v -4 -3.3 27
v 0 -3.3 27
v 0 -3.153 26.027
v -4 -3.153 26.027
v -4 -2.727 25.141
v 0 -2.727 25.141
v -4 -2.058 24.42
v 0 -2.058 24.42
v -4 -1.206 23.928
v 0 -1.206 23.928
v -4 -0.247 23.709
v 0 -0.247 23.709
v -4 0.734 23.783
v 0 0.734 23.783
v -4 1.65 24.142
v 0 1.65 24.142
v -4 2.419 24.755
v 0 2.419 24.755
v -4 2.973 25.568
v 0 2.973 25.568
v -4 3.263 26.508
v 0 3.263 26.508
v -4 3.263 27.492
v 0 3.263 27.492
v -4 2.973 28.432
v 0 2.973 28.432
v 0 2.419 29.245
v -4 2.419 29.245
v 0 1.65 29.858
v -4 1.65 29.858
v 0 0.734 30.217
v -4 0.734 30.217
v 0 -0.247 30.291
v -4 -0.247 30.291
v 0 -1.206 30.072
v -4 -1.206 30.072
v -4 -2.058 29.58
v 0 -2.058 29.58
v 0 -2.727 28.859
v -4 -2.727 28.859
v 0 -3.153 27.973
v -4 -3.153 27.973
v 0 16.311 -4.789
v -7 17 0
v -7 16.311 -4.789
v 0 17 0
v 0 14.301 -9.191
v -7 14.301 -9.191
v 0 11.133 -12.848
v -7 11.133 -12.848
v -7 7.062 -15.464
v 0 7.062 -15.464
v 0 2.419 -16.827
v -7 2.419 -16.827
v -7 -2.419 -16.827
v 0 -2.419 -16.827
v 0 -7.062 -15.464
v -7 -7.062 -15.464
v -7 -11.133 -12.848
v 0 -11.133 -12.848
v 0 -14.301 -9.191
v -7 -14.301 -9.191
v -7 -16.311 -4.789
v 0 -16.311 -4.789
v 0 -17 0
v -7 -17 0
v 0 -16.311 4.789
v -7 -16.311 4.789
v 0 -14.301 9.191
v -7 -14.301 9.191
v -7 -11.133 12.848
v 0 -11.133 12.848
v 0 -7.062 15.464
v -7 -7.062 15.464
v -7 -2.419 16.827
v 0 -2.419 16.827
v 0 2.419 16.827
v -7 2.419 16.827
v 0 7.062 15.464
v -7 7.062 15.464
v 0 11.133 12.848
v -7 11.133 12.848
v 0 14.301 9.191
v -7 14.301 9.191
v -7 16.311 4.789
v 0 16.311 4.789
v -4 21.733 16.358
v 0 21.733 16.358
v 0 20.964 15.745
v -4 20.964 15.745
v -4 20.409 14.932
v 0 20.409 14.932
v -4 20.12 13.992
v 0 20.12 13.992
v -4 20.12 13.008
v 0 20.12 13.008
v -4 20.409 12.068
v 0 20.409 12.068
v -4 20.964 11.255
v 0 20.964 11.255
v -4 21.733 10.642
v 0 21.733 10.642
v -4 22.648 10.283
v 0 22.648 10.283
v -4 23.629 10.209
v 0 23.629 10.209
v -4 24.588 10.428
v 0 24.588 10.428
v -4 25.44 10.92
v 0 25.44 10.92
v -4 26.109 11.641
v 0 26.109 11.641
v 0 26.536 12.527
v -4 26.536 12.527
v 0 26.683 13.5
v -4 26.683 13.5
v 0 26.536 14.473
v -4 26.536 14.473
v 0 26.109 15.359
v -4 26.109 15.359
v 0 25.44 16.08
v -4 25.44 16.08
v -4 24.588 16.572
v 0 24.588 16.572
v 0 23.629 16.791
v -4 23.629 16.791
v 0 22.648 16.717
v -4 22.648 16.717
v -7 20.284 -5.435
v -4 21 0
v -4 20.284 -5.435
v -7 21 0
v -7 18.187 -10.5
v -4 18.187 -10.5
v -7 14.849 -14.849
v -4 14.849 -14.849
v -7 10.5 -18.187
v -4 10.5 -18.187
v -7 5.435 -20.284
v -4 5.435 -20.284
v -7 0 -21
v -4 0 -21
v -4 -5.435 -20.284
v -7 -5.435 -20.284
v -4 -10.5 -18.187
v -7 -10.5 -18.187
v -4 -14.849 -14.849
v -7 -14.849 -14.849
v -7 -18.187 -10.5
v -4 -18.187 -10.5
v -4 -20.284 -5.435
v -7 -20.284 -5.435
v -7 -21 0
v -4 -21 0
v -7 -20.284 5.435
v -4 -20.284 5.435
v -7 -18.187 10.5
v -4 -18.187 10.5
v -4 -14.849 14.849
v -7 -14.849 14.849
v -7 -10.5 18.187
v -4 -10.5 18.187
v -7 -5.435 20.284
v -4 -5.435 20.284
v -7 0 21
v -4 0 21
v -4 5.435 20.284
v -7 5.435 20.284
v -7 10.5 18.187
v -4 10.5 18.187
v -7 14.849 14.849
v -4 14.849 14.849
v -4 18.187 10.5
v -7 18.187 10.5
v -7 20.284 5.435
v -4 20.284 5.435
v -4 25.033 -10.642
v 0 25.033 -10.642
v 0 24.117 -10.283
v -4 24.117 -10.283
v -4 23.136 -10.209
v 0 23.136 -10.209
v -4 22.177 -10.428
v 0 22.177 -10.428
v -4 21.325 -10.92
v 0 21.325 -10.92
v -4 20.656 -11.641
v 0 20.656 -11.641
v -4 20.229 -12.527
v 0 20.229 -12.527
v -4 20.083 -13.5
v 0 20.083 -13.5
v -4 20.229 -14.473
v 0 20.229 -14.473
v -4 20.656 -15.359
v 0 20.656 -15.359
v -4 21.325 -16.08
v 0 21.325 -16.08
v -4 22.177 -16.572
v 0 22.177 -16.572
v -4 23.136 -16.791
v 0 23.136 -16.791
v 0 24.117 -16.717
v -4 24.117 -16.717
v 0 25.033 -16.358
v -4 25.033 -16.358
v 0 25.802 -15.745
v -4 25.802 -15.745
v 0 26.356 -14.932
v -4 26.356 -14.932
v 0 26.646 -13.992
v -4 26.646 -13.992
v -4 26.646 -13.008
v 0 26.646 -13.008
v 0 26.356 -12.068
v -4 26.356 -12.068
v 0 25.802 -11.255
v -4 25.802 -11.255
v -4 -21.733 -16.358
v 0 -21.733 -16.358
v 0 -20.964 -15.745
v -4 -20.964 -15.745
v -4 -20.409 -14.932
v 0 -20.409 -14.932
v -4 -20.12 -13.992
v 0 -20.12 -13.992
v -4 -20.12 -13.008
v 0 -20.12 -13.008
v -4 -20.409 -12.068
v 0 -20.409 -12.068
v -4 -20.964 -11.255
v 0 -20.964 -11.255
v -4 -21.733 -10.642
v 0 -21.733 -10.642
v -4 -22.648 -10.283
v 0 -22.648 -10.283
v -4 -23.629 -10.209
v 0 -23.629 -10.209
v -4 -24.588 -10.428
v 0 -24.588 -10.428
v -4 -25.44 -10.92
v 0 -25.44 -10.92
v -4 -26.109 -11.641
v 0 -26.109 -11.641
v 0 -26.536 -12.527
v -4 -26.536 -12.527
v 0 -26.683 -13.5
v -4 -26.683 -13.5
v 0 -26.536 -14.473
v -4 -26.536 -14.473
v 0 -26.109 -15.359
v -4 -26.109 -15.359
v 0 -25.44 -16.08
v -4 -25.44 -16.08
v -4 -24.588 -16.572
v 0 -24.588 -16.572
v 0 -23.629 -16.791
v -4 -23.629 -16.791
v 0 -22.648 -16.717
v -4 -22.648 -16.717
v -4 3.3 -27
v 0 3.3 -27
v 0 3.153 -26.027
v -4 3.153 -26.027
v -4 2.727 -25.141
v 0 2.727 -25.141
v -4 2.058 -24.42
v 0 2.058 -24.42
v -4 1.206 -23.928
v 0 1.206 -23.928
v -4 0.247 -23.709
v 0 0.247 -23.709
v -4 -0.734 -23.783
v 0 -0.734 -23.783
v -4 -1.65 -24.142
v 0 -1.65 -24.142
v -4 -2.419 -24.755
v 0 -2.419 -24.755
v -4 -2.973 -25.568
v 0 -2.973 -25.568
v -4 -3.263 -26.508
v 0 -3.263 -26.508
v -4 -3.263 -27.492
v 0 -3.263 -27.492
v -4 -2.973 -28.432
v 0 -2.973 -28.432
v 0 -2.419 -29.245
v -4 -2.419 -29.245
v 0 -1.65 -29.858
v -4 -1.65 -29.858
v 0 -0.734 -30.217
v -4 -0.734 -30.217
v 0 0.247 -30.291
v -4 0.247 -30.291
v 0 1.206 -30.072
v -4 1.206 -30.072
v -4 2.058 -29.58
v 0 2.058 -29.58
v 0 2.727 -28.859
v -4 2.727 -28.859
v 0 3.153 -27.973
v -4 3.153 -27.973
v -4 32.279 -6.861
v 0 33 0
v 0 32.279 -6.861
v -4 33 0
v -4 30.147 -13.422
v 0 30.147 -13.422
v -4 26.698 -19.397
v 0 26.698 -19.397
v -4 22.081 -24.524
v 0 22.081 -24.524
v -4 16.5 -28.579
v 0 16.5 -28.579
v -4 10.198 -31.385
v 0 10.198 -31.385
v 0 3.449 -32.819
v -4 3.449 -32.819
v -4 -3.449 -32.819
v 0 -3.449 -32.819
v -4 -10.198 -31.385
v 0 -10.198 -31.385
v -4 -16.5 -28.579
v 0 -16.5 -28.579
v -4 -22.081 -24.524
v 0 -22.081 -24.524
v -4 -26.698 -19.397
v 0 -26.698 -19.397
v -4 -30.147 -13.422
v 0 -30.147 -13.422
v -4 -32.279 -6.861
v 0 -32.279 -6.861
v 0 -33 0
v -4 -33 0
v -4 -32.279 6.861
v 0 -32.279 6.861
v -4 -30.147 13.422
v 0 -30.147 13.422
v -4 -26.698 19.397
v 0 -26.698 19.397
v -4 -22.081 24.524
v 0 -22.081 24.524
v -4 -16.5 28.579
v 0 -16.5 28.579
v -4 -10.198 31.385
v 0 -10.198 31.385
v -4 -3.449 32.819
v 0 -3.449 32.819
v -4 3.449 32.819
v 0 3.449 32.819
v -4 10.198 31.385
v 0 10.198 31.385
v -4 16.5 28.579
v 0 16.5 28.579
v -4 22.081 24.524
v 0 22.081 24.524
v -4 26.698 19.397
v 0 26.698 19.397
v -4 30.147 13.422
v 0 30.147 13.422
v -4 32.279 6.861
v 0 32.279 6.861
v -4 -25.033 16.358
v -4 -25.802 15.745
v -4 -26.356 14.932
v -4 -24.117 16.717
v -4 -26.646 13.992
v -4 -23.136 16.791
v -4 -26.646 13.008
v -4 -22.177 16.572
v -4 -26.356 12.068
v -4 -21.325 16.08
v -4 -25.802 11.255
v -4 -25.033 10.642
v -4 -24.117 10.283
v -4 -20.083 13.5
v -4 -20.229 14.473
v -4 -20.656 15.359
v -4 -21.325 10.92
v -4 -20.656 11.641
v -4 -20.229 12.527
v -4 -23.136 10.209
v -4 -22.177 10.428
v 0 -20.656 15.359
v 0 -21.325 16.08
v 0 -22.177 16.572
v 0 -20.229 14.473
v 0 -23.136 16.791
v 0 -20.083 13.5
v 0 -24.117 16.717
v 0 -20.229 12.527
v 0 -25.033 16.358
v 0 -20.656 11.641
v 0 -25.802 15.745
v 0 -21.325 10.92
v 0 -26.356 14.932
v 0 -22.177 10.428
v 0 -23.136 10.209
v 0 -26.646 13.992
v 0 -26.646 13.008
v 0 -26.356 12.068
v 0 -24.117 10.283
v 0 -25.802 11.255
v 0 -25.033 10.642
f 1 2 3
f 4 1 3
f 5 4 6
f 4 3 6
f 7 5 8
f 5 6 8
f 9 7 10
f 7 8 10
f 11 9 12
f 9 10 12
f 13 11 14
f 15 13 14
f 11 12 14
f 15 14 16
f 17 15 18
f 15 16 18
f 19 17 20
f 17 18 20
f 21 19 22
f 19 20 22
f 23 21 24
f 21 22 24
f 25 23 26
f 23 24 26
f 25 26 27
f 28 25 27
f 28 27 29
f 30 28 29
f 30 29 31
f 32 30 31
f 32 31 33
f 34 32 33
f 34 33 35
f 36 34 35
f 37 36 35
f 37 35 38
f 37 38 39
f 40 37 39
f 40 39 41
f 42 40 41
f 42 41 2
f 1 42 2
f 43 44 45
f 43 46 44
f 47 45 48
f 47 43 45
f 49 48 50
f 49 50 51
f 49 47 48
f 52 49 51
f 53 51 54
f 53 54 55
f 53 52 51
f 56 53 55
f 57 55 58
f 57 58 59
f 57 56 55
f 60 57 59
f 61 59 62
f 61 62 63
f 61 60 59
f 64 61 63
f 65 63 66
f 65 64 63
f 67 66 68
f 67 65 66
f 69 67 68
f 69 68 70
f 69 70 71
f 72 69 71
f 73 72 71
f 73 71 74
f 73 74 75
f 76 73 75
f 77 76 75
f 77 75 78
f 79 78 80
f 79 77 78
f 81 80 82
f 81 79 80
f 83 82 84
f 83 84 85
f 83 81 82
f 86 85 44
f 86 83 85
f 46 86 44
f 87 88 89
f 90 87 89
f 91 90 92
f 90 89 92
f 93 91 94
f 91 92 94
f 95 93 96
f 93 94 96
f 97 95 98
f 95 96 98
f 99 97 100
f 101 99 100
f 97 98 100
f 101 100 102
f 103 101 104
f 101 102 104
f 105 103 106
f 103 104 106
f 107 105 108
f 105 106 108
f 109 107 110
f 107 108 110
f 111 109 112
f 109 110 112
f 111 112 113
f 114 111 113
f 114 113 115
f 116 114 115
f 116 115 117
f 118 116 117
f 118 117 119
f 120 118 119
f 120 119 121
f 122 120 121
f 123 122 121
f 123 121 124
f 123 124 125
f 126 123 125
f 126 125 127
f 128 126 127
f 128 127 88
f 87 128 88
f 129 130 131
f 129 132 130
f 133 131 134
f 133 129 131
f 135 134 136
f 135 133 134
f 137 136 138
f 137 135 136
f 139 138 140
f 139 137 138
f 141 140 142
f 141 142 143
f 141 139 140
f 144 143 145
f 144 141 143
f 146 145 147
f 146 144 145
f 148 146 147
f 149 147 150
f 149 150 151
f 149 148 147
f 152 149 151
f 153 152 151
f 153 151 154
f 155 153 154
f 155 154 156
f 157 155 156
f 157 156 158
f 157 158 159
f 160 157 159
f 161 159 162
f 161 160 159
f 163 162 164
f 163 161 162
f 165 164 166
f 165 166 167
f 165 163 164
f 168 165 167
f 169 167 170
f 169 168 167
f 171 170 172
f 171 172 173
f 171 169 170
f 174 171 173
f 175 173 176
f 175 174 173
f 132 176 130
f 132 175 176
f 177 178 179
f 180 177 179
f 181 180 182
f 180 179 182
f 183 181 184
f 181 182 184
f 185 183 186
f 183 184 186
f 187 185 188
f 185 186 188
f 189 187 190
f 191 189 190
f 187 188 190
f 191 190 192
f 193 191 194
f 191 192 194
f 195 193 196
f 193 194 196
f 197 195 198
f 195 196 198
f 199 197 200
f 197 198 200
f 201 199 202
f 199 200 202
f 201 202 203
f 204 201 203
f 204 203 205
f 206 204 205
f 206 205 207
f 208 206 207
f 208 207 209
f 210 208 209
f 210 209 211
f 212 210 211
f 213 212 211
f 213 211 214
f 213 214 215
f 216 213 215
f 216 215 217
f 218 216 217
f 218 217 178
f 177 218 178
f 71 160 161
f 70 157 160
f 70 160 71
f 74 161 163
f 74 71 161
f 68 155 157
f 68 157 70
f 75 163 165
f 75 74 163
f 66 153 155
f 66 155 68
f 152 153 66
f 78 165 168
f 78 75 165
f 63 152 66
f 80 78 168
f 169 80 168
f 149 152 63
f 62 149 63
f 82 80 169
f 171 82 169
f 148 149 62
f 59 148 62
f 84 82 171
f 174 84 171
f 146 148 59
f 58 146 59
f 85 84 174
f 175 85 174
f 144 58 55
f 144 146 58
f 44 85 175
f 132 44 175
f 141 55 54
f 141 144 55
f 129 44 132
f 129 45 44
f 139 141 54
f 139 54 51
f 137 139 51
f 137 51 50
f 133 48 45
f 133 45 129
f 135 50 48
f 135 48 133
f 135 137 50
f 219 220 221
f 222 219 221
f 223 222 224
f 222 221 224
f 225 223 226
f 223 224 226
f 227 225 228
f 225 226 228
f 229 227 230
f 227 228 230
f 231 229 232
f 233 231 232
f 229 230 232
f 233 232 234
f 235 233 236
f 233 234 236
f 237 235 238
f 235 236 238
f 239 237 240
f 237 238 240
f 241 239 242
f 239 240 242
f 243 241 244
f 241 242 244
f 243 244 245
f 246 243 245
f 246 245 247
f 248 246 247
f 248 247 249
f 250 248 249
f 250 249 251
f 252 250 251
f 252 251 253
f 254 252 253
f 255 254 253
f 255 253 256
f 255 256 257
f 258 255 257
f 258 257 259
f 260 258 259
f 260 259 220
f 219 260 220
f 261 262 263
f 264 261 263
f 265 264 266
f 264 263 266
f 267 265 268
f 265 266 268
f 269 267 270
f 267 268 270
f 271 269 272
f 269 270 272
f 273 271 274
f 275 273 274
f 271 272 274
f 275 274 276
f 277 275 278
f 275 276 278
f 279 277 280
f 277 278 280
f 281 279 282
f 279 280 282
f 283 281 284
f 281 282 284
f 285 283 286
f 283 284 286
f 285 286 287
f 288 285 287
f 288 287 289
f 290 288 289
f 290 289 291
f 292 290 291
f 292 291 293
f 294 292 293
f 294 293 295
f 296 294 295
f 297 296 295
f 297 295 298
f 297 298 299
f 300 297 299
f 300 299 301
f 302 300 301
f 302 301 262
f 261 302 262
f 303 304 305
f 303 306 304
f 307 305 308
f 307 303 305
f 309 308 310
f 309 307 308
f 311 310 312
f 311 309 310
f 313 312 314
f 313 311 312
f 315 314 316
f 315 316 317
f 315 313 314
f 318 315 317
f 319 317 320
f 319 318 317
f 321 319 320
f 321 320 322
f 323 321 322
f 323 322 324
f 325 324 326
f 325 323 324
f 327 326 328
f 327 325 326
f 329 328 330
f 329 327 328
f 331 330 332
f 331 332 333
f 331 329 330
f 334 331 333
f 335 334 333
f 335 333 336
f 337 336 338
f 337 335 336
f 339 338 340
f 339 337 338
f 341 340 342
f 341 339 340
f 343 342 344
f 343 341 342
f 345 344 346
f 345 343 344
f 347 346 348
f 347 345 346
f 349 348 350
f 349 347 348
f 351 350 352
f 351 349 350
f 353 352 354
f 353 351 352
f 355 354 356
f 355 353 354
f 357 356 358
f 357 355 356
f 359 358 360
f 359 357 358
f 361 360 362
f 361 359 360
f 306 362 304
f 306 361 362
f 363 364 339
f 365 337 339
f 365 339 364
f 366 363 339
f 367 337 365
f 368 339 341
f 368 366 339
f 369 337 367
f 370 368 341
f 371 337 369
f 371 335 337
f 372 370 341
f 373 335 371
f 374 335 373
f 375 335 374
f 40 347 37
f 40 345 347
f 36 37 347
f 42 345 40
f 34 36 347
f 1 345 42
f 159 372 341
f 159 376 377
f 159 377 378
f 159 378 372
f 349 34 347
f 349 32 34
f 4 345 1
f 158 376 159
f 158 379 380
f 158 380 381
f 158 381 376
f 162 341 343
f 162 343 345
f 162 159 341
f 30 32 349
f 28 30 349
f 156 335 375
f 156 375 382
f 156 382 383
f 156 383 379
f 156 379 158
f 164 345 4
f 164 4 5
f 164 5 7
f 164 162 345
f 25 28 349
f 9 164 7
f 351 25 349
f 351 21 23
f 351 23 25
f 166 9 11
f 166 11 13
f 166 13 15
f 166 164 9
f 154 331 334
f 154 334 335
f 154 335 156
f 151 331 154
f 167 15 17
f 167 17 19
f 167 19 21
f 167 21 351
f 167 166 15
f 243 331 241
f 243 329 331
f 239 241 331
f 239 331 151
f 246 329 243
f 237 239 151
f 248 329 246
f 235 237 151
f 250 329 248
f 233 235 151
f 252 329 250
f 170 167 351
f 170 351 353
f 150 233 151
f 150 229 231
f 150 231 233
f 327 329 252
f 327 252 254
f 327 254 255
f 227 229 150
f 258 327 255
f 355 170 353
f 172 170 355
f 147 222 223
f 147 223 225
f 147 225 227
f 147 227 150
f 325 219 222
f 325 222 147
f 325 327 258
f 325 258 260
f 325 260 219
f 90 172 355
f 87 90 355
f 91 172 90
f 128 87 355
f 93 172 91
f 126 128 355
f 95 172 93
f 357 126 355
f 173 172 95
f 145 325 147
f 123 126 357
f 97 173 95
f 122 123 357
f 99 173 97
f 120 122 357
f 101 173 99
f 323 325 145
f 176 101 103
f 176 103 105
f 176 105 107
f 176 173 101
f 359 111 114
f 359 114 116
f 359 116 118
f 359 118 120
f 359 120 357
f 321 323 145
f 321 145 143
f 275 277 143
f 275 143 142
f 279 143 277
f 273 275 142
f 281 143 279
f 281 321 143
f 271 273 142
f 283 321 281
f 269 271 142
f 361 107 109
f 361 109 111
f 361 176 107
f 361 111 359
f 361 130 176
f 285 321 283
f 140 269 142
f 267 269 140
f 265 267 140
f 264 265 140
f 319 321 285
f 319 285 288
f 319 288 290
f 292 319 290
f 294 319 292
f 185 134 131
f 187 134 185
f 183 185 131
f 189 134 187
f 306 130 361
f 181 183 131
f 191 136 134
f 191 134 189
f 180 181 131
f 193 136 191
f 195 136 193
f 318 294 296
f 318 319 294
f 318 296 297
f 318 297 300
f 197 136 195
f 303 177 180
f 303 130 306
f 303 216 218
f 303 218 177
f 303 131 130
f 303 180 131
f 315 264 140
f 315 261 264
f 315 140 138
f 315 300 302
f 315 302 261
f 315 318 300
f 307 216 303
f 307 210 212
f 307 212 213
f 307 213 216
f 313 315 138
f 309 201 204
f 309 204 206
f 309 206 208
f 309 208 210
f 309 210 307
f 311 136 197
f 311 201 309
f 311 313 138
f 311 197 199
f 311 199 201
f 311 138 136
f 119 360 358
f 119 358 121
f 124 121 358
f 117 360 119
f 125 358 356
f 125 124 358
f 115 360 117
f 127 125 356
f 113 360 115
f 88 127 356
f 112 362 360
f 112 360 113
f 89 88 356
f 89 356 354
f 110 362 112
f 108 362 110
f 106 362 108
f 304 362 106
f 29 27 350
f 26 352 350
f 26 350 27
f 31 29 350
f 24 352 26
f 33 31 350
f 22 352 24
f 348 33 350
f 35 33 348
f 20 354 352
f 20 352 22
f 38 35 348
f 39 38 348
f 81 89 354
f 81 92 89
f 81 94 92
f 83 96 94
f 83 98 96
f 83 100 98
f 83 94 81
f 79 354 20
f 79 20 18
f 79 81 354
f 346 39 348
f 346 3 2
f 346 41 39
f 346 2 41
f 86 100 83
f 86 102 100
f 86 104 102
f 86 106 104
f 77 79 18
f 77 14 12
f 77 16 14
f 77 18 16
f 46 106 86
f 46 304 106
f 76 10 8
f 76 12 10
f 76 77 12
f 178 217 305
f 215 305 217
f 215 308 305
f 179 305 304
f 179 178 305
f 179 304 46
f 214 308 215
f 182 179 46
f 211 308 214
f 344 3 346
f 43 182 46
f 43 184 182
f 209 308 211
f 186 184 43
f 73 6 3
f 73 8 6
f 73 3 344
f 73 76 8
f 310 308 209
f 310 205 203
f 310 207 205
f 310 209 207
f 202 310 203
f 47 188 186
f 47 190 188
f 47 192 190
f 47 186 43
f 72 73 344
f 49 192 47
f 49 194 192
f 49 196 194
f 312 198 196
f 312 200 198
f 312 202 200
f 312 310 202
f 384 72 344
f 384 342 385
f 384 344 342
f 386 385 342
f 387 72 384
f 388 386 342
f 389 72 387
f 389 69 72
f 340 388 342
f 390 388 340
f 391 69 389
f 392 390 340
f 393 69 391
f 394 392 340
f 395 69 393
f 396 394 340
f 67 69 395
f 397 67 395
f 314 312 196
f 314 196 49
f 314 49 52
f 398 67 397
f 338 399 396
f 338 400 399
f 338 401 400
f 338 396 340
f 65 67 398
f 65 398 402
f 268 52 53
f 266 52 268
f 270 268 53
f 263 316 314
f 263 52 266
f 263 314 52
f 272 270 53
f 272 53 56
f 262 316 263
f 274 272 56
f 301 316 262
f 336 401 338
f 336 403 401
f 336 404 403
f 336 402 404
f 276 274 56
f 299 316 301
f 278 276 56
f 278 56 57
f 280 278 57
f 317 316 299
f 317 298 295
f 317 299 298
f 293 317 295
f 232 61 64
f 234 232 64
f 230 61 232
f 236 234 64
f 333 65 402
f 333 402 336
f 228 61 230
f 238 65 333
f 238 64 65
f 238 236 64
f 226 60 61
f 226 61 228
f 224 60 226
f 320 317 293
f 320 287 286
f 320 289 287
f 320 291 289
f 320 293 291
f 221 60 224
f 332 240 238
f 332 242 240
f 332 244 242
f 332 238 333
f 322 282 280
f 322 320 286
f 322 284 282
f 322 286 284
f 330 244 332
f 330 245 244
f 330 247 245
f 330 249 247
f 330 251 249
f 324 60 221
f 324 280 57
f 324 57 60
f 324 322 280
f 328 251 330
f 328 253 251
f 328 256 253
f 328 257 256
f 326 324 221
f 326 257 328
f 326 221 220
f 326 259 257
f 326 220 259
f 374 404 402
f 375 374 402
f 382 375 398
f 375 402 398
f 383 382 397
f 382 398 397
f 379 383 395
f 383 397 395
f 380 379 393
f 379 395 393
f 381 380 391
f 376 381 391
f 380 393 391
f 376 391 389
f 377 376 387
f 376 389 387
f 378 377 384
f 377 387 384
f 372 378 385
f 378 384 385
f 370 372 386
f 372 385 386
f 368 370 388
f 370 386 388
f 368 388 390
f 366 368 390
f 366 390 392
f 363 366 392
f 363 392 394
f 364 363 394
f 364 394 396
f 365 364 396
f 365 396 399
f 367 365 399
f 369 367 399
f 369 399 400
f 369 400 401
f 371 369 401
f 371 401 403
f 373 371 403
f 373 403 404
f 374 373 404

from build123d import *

# Parameters (mm, degrees)
M6_CLEARANCE_HOLE1_D     = 6.6
M6_CLEARANCE_HOLE1_DEPTH = 4
CIRPATTERN1_COUNT        = 6


with BuildPart() as part:
    # Sketch2 → Revolve1 (revolve)
    with BuildSketch(Plane.XY):
        Polygon((-7, 21), (-7, 17), (0, 17), (0, 33), (-4, 33), (-4, 21), align=None)
    revolve(axis=Axis((0, 0, 0), (-1, 0, 0)))

    # M6 Clearance Hole1
    with Locations(Plane(origin=(-4, 0, -27), x_dir=(0, -1, 0), z_dir=(-1, 0, 0))):
        with Locations((0, 0)):
            m6_clearance_hole1 = Hole(M6_CLEARANCE_HOLE1_D / 2, depth=M6_CLEARANCE_HOLE1_DEPTH)

    # CirPattern1: M6 Clearance Hole1 ×6 about axis
    cirpattern1_axis = Axis((0, 0, 0), (1, 0, 0))
    for i in range(1, CIRPATTERN1_COUNT):
        add(m6_clearance_hole1.rotate(cirpattern1_axis, i * 360 / CIRPATTERN1_COUNT), mode=Mode.SUBTRACT)


solid = part.part
